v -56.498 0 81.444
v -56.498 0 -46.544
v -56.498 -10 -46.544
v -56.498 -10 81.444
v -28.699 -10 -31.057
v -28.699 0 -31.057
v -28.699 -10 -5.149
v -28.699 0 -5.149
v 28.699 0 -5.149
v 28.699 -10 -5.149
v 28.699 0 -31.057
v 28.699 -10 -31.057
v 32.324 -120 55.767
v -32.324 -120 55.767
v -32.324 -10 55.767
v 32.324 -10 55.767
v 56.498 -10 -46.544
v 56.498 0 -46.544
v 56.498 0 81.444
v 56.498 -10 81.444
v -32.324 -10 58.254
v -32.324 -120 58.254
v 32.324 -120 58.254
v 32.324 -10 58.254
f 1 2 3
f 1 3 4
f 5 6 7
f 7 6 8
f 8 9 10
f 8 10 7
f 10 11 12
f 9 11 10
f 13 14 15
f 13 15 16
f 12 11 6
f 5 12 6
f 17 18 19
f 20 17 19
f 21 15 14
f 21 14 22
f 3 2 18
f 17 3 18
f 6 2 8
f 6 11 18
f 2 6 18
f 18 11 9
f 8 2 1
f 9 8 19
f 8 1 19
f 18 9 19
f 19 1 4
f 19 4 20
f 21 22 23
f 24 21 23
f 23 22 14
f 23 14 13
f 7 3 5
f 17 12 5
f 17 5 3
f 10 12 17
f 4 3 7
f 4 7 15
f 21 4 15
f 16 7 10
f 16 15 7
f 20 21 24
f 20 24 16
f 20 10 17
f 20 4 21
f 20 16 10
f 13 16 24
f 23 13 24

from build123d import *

# Parameters (mm, degrees)
F0_W     = 64.647466
F0_H     = 2.486437
F1_DEPTH = 120
F2_W     = 112.995804
F2_H     = 127.987776
F3_DEPTH = 10
F4_W     = 57.398408
F4_H     = 25.908977
F5_DEPTH = 25


with BuildPart() as f1:
    # F0 (on Front) → F1 (new body)
    with BuildSketch(Plane.XZ):
        with Locations((0, 57.010516)):
            Rectangle(F0_W, F0_H)
    extrude(amount=F1_DEPTH)

    # F2 (on Front) → F3 (join)
    with BuildSketch(Plane.XZ):
        with Locations((0, 17.450197)):
            Rectangle(F2_W, F2_H)
    extrude(amount=F3_DEPTH)

    # F4 (on face) → F5 (cut)
    with BuildSketch(Plane(origin=(0, 0, 0), x_dir=(-1, 0, 0), z_dir=(0, 1, 0))):
        with Locations((0, -18.103005)):
            Rectangle(F4_W, F4_H)
    extrude(amount=-F5_DEPTH, mode=Mode.SUBTRACT)


solid = f1.part
